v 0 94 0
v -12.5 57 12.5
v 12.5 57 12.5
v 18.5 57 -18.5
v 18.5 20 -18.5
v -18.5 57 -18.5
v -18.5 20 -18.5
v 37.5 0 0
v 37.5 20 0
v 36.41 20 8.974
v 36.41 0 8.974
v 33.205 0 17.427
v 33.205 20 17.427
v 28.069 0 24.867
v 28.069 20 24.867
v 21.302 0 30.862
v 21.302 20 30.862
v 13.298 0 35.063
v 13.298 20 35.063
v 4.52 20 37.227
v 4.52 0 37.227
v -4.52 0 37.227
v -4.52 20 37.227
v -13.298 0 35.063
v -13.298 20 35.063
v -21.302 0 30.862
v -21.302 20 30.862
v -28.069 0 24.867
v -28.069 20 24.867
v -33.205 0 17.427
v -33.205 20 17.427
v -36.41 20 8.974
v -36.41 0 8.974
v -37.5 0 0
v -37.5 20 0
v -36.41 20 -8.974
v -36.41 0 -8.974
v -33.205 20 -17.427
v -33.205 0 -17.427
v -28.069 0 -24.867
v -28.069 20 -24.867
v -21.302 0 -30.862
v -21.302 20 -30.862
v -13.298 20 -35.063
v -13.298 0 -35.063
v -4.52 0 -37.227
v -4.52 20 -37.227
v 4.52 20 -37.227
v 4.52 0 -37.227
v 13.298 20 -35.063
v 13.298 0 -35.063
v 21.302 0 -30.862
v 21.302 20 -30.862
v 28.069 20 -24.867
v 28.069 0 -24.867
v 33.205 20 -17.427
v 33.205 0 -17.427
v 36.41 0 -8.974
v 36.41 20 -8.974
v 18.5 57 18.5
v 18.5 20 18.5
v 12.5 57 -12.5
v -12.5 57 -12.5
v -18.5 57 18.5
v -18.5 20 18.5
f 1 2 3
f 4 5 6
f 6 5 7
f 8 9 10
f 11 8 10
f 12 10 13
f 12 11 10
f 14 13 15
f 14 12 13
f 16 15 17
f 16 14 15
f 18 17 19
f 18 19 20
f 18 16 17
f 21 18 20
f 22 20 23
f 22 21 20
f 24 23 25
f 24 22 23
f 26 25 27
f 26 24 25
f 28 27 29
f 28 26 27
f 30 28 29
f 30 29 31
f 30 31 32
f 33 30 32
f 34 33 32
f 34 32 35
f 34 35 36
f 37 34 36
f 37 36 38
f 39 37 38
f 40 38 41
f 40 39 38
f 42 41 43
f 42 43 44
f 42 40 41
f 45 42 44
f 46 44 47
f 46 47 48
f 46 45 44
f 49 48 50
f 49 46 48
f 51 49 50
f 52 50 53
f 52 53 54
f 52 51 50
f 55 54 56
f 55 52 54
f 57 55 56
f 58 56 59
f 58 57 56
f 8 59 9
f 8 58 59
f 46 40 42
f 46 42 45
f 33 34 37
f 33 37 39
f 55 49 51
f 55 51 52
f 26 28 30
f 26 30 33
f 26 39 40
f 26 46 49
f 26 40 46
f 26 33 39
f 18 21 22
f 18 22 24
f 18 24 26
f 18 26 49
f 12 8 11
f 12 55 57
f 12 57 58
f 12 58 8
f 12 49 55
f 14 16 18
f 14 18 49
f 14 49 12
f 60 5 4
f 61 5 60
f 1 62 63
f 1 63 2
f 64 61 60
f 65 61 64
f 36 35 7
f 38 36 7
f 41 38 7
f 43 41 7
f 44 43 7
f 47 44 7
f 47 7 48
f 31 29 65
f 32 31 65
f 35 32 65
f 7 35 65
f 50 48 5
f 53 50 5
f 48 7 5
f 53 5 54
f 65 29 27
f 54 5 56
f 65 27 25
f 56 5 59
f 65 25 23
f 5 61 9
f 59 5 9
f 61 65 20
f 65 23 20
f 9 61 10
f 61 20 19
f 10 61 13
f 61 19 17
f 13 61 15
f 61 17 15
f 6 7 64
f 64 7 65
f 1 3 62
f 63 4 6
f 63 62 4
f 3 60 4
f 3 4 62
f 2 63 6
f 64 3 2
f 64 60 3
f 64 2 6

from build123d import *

# Parameters (mm, degrees)
F0_R     = 37.5
F1_DEPTH = 20
F2_W     = 37
F2_H     = 37
F3_DEPTH = 37
F4_W     = 25
F4_H     = 25


with BuildPart() as f1:
    # F0 (on Front) → F1 (new body)
    with BuildSketch(Plane.XZ):
        Circle(F0_R)
    extrude(amount=-F1_DEPTH)

    # F2 (on face) → F3 (join)
    with BuildSketch(Plane(origin=(0, 20, 0), x_dir=(-1, 0, 0), z_dir=(0, 1, 0))):
        Rectangle(F2_W, F2_H)
    extrude(amount=F3_DEPTH)

    # F4 (on face) → F8 section 0
    with BuildSketch(Plane(origin=(0, 57, 0), x_dir=(-1, 0, 0), z_dir=(0, 1, 0)), mode=Mode.PRIVATE) as f8_s0:
        Rectangle(F4_W, F4_H)
    loft([f8_s0.sketch, Vertex(0, 94, 0)])


solid = f1.part
